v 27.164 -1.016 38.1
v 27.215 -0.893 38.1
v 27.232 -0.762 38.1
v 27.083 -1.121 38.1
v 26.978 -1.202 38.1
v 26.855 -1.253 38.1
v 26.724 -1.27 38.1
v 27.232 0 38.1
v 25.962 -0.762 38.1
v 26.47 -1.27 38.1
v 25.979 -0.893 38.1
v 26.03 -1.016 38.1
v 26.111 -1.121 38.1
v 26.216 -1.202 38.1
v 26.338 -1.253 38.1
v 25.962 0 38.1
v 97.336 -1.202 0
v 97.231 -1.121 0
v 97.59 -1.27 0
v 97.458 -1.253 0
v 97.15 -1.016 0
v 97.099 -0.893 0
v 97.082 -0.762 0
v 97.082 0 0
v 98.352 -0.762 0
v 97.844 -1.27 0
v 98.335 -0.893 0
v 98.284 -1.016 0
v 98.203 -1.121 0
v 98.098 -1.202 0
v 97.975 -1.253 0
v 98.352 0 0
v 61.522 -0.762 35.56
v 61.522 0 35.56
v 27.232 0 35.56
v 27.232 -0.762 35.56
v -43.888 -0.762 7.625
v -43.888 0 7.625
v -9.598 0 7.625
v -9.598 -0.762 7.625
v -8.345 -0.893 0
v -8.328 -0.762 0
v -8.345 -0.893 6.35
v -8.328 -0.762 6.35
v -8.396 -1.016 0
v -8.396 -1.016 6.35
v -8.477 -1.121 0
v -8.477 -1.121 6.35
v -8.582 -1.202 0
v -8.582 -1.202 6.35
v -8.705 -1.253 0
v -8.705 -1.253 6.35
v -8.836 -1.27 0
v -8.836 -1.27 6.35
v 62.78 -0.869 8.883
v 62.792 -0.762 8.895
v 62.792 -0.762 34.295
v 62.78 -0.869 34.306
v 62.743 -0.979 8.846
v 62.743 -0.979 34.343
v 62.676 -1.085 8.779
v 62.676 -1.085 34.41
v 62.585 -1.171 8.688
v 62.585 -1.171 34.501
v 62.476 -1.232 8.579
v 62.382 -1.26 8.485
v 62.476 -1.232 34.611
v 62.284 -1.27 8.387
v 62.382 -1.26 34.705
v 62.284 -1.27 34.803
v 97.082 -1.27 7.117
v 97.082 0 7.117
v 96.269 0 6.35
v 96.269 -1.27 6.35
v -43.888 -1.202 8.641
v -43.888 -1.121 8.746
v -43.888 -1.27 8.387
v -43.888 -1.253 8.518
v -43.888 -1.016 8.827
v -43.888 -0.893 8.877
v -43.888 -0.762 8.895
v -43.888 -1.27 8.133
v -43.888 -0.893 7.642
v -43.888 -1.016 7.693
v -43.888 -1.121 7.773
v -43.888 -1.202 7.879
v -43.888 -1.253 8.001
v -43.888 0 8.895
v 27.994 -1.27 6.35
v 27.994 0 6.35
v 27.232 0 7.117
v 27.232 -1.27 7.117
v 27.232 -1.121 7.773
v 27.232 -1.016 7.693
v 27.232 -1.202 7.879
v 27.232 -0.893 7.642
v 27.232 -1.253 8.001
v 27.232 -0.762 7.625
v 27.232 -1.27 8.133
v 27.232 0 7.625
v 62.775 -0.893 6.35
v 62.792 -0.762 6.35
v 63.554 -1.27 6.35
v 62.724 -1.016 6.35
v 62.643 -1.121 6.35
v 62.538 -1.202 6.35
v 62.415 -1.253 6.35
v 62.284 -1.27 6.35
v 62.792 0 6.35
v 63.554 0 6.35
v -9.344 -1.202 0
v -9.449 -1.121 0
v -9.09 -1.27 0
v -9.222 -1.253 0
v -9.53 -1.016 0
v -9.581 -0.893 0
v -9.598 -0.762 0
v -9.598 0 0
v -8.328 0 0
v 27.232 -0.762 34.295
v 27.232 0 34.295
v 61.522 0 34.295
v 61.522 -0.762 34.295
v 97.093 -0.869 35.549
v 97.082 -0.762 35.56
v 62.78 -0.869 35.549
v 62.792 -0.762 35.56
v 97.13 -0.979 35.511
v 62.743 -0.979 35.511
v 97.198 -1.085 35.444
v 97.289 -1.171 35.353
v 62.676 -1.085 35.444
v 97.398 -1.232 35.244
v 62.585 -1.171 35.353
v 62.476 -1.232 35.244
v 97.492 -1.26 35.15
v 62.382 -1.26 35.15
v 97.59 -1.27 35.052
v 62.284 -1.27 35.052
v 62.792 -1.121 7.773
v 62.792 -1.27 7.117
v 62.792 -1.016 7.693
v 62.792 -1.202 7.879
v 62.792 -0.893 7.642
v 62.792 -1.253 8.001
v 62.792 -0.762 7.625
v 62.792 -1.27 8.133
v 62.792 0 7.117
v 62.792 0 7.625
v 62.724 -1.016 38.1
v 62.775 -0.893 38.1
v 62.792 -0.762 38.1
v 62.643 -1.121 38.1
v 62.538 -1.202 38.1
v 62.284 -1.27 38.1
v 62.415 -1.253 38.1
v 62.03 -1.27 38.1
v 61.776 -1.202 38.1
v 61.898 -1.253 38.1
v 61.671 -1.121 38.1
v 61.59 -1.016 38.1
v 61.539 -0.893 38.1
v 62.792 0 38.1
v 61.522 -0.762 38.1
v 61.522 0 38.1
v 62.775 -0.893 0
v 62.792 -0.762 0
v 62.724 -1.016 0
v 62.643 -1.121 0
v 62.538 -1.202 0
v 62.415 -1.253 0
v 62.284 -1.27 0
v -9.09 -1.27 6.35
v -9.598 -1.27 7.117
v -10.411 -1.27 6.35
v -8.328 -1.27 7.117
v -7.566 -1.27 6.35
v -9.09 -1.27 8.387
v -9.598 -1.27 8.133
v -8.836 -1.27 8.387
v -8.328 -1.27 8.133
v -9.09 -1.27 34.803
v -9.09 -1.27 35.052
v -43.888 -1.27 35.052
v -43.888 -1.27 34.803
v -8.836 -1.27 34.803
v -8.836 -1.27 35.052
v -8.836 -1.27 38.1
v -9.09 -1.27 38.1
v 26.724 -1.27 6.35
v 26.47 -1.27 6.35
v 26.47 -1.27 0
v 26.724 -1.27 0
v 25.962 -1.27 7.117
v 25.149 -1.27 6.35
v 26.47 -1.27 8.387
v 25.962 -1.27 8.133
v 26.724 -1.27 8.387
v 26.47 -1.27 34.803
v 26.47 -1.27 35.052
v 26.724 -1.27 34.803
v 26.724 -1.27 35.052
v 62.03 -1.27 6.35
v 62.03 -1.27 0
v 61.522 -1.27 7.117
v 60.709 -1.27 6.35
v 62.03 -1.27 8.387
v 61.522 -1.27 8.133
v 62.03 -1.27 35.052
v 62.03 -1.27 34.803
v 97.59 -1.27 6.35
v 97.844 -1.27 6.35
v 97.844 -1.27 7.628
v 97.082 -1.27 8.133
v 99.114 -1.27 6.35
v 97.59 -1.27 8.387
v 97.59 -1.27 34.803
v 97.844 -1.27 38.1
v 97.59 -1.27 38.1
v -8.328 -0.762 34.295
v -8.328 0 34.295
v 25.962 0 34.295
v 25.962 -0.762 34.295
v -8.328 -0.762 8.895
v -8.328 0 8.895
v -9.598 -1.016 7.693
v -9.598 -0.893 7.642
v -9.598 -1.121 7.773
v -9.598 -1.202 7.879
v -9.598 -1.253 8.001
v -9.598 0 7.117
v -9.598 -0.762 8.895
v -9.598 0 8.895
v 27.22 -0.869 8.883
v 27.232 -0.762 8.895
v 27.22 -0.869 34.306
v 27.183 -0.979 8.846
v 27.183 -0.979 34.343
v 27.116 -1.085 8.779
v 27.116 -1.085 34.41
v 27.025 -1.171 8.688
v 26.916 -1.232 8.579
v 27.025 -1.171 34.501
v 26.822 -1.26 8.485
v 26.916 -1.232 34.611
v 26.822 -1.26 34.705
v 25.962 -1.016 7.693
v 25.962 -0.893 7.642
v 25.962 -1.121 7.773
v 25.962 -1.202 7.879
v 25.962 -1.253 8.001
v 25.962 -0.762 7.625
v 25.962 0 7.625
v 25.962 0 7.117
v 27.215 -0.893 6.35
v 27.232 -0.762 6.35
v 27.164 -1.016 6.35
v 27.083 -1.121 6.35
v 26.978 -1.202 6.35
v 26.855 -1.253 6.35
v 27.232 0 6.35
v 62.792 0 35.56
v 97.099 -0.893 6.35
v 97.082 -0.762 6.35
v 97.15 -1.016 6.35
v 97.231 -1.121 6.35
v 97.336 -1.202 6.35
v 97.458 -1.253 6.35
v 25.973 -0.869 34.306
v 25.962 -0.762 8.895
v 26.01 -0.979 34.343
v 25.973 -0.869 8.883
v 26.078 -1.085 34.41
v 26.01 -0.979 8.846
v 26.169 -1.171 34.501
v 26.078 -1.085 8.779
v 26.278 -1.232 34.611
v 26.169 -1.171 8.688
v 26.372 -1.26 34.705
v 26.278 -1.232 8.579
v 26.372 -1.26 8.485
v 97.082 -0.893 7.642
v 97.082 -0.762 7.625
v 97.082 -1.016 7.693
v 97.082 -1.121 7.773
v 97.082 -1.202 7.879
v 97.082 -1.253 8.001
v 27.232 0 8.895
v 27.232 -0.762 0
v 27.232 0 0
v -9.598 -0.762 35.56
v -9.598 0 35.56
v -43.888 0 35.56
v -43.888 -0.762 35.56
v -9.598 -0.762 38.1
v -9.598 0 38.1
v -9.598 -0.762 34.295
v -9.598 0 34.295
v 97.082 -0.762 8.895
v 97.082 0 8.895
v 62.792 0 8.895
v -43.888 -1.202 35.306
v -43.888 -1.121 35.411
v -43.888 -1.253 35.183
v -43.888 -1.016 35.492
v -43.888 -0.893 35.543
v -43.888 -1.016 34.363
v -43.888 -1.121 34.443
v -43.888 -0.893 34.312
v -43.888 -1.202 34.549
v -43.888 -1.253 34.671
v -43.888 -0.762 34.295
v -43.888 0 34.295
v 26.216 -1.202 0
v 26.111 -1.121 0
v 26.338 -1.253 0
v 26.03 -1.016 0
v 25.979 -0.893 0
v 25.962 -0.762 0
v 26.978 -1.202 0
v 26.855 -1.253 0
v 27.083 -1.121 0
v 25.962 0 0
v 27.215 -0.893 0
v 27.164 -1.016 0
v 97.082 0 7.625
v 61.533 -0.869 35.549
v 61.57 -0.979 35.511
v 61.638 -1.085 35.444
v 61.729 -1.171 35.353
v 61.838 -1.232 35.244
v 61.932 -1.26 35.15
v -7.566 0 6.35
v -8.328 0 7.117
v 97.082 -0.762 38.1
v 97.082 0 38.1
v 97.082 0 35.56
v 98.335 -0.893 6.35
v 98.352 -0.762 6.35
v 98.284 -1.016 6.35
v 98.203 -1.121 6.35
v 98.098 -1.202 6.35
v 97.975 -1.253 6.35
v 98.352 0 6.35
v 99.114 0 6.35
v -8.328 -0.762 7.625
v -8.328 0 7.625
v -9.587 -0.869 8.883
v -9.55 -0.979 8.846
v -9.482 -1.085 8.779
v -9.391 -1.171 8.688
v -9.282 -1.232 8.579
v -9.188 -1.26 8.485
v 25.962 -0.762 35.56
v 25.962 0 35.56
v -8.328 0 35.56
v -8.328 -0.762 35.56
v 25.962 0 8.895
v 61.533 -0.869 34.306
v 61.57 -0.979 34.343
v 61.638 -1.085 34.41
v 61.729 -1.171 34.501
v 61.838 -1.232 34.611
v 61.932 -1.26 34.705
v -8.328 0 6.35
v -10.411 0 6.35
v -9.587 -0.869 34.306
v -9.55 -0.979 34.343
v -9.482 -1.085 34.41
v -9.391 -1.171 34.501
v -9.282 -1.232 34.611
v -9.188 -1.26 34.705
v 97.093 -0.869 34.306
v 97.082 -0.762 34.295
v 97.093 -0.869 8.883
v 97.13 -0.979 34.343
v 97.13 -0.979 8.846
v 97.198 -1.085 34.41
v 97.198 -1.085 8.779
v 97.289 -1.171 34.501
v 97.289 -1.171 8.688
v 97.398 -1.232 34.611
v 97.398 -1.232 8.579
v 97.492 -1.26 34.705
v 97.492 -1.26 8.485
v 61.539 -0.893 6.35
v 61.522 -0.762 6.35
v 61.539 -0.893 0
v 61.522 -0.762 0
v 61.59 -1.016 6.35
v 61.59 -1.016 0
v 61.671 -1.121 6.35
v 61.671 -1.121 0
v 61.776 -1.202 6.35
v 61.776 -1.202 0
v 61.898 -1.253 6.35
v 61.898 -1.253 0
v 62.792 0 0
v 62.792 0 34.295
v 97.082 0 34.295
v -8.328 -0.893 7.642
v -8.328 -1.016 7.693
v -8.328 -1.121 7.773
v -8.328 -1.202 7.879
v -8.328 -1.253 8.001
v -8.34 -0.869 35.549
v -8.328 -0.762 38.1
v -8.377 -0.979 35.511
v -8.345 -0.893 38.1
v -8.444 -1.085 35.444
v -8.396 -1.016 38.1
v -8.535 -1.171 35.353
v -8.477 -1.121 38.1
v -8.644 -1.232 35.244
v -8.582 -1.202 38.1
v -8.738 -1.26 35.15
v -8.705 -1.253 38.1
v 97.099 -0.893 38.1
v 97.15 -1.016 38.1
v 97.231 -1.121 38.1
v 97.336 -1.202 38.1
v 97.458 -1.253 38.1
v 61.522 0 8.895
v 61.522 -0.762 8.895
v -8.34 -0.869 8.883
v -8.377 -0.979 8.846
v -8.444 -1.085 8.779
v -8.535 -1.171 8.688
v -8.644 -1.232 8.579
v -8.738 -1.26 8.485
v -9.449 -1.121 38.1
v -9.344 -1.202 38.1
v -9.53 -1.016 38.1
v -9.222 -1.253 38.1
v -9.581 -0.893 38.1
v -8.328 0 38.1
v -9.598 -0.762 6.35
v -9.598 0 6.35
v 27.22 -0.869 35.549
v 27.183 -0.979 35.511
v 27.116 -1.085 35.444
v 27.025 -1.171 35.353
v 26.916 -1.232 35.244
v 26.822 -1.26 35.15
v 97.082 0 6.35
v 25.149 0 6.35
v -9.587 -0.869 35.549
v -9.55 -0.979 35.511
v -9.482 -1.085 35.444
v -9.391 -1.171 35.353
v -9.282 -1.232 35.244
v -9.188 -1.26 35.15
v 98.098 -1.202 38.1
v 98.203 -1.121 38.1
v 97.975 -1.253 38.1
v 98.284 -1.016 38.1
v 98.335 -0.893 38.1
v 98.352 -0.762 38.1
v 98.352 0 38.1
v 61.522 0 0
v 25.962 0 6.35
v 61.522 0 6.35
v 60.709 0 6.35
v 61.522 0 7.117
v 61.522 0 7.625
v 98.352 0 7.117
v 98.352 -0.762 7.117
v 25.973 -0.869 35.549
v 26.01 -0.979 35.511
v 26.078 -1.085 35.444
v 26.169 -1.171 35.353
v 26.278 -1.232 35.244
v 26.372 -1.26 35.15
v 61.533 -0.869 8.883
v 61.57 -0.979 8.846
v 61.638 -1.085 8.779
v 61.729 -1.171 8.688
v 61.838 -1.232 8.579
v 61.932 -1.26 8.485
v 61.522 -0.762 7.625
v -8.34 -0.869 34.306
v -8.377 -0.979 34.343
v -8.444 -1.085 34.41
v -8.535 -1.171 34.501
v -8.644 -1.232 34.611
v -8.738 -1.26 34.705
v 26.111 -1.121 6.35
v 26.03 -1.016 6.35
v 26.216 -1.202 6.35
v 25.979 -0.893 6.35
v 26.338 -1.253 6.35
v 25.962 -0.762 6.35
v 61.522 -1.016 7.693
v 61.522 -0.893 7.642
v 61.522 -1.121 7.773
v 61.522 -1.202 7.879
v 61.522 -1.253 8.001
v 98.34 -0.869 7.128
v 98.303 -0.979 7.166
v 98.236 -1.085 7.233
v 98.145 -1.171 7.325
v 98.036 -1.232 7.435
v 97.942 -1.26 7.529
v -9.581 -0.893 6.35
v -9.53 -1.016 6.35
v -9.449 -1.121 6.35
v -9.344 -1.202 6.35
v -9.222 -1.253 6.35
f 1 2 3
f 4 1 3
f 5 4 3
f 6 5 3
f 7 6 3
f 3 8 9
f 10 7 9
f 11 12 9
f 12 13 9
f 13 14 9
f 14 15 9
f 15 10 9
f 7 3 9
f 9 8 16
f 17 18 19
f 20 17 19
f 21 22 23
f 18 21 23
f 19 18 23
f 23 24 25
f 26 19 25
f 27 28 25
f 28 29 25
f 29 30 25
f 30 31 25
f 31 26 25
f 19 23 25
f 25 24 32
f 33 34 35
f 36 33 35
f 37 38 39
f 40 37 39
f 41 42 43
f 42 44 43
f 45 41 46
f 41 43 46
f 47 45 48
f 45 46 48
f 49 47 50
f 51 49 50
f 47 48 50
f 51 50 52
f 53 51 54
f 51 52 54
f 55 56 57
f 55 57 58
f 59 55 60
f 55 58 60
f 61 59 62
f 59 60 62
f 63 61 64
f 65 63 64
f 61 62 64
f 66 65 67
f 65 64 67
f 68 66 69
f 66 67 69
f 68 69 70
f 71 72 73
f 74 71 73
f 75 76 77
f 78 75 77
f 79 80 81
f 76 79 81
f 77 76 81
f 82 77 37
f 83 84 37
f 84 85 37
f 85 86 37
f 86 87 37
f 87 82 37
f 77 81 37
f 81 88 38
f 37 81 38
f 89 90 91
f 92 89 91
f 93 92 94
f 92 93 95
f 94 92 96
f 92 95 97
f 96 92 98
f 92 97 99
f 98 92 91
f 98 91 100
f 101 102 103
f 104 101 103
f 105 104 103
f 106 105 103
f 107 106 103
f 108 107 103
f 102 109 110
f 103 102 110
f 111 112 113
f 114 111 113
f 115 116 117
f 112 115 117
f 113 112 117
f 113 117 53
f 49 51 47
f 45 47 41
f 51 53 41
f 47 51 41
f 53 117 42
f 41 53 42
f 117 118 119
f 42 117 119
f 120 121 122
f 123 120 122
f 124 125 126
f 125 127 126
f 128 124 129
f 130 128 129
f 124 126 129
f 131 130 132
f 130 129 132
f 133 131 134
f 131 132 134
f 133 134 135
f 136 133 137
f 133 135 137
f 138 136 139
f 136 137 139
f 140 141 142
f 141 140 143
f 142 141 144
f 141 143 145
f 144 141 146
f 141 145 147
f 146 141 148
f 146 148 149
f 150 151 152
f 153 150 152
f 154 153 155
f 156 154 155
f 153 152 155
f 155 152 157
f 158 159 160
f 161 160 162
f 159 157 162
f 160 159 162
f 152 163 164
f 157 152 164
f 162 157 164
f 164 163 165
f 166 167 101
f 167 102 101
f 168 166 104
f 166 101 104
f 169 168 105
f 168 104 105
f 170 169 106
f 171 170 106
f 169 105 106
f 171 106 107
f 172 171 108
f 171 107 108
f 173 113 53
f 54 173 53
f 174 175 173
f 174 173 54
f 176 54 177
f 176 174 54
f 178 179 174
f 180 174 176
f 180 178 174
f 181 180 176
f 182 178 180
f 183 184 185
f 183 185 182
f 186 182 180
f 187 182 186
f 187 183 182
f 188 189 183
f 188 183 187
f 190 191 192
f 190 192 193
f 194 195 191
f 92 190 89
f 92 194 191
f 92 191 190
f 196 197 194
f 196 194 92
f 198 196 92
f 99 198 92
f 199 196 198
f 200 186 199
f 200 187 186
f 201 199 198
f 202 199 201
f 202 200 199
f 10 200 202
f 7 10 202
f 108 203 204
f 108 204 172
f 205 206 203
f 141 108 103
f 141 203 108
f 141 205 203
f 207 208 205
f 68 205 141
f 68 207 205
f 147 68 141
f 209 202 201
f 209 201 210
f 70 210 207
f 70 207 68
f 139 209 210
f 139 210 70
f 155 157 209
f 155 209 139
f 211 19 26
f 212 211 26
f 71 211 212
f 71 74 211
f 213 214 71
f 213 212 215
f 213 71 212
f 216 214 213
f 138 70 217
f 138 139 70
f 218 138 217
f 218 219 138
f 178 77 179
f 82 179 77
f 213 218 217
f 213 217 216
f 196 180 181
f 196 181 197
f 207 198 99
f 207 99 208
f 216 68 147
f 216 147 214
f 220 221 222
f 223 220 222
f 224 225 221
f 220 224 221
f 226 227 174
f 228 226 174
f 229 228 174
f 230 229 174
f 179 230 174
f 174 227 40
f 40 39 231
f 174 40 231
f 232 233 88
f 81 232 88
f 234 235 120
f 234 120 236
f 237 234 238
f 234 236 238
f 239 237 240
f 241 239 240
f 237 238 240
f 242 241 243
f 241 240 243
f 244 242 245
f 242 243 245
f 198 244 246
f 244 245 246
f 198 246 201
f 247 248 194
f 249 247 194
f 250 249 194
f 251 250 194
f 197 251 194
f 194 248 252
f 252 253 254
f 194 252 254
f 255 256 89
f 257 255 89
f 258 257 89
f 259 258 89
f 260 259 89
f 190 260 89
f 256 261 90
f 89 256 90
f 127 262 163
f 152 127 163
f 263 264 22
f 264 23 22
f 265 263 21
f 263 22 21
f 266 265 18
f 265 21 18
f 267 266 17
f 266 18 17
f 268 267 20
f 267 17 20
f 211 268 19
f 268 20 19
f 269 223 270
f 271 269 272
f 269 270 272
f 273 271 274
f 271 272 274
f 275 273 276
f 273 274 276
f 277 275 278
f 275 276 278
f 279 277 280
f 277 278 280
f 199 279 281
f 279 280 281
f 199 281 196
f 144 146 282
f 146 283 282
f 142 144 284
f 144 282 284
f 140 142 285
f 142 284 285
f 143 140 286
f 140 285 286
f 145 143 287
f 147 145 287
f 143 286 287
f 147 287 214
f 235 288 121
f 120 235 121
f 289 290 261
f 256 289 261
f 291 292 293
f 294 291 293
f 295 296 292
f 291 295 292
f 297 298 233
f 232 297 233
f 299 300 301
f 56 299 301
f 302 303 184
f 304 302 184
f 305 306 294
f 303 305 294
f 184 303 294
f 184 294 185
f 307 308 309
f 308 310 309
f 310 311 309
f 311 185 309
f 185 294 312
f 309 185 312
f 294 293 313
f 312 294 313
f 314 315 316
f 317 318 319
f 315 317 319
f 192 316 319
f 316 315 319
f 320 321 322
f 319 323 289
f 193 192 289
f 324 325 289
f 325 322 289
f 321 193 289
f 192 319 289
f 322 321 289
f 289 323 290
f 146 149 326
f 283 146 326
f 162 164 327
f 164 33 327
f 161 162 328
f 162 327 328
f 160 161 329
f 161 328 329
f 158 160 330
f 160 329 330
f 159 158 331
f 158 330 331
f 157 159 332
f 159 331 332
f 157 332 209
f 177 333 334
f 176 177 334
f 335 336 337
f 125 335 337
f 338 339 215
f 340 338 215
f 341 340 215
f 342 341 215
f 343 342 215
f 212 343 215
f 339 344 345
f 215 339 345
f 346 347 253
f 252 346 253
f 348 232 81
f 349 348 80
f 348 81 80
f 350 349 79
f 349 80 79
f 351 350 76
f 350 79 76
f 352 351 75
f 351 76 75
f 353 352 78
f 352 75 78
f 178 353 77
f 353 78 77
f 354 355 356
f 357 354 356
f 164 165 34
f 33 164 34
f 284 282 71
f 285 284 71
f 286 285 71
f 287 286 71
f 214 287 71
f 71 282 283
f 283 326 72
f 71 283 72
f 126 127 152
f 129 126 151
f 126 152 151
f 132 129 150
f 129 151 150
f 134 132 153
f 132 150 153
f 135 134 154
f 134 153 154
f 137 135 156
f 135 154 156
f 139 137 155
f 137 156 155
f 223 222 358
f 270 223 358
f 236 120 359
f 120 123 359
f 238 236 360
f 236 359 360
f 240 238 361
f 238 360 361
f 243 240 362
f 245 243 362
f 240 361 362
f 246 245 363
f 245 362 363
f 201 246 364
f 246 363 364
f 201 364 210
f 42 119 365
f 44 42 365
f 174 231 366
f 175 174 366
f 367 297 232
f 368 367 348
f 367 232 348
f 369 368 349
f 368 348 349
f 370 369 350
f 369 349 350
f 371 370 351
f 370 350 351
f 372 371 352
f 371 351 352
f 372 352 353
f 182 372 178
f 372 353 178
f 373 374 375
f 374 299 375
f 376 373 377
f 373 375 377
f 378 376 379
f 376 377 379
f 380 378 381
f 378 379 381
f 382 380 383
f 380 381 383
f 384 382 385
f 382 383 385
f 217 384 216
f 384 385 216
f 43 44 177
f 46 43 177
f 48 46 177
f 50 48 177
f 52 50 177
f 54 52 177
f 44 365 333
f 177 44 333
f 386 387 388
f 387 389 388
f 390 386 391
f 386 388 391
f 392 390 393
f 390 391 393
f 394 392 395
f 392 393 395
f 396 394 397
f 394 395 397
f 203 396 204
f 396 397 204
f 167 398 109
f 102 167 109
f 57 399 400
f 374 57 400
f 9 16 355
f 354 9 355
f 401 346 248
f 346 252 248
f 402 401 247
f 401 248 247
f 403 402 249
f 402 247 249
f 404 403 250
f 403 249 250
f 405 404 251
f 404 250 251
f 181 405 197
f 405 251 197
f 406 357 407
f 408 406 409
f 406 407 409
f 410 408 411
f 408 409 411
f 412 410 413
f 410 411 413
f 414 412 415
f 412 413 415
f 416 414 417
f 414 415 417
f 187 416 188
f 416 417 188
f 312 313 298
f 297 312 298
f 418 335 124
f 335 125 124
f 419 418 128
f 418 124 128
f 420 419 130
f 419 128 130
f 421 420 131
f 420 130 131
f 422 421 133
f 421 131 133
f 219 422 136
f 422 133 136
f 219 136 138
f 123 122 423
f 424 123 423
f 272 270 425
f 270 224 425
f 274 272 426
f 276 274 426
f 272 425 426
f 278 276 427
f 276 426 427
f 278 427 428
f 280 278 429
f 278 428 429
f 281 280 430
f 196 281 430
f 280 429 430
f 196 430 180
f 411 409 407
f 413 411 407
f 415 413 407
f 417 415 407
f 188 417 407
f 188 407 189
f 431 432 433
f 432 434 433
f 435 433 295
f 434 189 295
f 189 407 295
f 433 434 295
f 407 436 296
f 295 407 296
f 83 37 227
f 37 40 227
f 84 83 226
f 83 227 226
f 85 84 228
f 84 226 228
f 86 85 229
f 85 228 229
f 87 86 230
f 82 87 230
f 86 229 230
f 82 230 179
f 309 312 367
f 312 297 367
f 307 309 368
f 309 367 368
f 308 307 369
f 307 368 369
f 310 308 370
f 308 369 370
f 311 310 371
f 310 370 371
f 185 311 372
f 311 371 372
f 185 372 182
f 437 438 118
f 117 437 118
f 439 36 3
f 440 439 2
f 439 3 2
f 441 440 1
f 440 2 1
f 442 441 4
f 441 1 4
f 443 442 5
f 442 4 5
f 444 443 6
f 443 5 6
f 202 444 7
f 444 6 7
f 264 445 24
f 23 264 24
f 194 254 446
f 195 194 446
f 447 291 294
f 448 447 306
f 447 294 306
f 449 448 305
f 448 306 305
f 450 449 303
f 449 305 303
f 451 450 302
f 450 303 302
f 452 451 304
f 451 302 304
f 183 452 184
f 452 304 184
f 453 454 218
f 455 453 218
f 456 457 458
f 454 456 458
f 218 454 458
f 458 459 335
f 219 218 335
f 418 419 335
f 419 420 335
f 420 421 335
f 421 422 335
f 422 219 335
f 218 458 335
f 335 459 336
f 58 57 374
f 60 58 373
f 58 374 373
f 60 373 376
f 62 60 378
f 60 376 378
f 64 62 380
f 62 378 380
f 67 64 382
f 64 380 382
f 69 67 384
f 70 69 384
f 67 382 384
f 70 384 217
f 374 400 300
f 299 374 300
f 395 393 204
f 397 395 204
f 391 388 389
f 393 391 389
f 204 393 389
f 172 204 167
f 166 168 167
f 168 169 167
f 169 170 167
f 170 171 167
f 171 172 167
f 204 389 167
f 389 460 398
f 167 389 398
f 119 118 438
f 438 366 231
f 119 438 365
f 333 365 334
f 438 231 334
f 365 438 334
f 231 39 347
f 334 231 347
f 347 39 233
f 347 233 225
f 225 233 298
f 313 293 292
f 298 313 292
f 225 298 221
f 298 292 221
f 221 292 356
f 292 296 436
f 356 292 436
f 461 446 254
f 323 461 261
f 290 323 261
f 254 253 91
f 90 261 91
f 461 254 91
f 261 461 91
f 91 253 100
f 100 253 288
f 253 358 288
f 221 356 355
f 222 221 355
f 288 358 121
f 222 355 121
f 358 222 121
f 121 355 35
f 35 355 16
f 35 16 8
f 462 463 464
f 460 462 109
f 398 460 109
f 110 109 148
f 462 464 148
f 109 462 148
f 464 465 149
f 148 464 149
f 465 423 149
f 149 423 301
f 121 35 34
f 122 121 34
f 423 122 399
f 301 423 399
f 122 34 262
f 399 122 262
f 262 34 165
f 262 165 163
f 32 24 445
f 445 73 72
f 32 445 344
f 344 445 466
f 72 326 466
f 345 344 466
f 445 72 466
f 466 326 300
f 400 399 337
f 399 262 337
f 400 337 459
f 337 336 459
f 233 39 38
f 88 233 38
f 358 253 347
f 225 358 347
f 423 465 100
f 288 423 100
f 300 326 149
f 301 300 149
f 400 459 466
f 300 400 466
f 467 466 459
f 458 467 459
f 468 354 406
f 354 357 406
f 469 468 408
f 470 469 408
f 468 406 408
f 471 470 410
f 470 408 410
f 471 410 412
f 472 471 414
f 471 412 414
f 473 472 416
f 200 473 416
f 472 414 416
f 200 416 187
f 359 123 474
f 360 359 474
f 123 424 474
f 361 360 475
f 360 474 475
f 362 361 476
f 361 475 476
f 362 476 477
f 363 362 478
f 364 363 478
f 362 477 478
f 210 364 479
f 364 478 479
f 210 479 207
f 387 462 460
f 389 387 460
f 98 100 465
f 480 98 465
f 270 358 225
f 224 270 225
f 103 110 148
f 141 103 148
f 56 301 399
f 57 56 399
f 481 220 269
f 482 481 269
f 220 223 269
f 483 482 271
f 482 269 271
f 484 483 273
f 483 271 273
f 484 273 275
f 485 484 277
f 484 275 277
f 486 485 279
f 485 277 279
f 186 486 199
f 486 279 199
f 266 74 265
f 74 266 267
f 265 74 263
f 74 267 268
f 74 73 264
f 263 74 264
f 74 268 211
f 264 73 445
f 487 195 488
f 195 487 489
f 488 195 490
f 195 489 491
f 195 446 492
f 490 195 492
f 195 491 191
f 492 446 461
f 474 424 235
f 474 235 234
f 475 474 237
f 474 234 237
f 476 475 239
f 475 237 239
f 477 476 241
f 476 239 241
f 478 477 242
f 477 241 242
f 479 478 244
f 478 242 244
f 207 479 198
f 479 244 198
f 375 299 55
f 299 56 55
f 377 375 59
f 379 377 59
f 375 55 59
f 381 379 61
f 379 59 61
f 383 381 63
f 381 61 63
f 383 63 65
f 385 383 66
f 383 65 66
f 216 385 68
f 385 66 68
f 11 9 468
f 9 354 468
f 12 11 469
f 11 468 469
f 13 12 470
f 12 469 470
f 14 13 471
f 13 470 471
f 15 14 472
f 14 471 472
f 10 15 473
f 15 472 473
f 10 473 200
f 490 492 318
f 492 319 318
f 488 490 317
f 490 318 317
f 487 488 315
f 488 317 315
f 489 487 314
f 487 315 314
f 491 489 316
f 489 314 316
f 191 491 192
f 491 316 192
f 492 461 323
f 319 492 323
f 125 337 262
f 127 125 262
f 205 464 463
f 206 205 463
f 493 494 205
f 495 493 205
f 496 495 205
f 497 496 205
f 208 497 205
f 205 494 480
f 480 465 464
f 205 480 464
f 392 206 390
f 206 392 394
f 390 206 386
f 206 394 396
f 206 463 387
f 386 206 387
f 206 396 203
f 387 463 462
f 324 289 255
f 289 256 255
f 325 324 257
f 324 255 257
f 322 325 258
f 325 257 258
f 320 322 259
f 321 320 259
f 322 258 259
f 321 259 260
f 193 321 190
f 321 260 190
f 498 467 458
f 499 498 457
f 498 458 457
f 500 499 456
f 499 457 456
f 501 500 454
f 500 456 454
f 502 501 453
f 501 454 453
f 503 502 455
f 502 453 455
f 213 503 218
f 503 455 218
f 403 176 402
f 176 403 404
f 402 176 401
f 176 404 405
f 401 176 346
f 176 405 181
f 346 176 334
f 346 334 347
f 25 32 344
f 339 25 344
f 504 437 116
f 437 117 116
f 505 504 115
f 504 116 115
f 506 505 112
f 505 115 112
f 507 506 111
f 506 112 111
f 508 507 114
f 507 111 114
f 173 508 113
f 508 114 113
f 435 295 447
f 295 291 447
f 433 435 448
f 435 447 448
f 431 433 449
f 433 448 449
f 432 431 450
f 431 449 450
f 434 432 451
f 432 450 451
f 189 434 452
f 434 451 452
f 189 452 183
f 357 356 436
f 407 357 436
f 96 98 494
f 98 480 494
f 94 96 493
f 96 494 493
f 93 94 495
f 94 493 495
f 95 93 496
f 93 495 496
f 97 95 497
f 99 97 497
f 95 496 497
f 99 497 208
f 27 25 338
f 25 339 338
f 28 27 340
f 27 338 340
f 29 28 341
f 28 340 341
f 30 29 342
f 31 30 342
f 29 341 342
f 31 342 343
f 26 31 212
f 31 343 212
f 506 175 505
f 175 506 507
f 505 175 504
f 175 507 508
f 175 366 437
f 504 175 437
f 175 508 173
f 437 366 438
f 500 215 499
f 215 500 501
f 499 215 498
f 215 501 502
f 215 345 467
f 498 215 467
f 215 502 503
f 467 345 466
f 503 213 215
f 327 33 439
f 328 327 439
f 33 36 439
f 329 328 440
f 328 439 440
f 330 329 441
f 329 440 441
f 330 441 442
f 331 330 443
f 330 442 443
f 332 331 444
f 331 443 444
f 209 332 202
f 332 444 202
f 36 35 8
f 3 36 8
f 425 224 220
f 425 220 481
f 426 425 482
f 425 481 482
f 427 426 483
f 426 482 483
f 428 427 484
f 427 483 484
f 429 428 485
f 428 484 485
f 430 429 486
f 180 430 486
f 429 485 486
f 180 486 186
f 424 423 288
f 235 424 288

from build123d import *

# Parameters (mm, degrees)
F1_DEPTH = 1.27
F2_R     = 0.508


with BuildPart() as f1:
    # F0 (on Front) → F1 (new body)
    with BuildSketch(Plane.XZ):
        Polygon((-8.3281235051, 34.2946868681), (-8.3281235051, 35.56), (-8.3281235051, 38.1), (-9.5981235051, 38.1), (-9.5981235051, 35.56), (-43.8881235051, 35.56), (-43.8881235051, 34.2946868681), (-9.5981235051, 34.2946868681), (-9.5981235051, 8.8946868681), (-43.8881235051, 8.8946868681), (-43.8881235051, 7.6246868681), (-9.5981235051, 7.6246868681), (-9.5981235051, 7.1166868681), (-10.4112418222, 6.35), (-9.5981235051, 6.35), (-9.5981235051, 0), (-8.3281235051, 0), (-8.3281235051, 6.35), (-7.5661235051, 6.35), (-8.3281235051, 7.1166868681), (-8.3281235051, 7.6246868681), (-8.3281235051, 8.8946868681), align=None)
        Polygon((27.2318764949, 34.2946868681), (27.2318764949, 35.56), (27.2318764949, 38.1), (25.9618764949, 38.1), (25.9618764949, 35.56), (-8.3281235051, 35.56), (-8.3281235051, 34.2946868681), (25.9618764949, 34.2946868681), (25.9618764949, 8.8946868681), (-8.3281235051, 8.8946868681), (-8.3281235051, 7.6246868681), (25.9618764949, 7.6246868681), (25.9618764949, 7.1166868681), (25.1487581778, 6.35), (25.9618764949, 6.35), (25.9618764949, 0), (27.2318764949, 0), (27.2318764949, 6.35), (27.9938764949, 6.35), (27.2318764949, 7.1166868681), (27.2318764949, 7.6246868681), (27.2318764949, 8.8946868681), align=None)
        Polygon((62.7918764949, 34.2946868681), (62.7918764949, 35.56), (62.7918764949, 38.1), (61.5218764949, 38.1), (61.5218764949, 35.56), (27.2318764949, 35.56), (27.2318764949, 34.2946868681), (61.5218764949, 34.2946868681), (61.5218764949, 8.8946868681), (27.2318764949, 8.8946868681), (27.2318764949, 7.6246868681), (61.5218764949, 7.6246868681), (61.5218764949, 7.1166868681), (60.7087581778, 6.35), (61.5218764949, 6.35), (61.5218764949, 0), (62.7918764949, 0), (62.7918764949, 6.35), (63.5538764949, 6.35), (62.7918764949, 7.1166868681), (62.7918764949, 7.6246868681), (62.7918764949, 8.8946868681), align=None)
        Polygon((98.3518764949, 7.1166868681), (98.3518764949, 38.1), (97.0818764949, 38.1), (97.0818764949, 35.56), (62.7918764949, 35.56), (62.7918764949, 34.2946868681), (97.0818764949, 34.2946868681), (97.0818764949, 8.8946868681), (62.7918764949, 8.8946868681), (62.7918764949, 7.6246868681), (97.0818764949, 7.6246868681), (97.0818764949, 7.1166868681), (96.2687581778, 6.35), (97.0818764949, 6.35), (97.0818764949, 0), (98.3518764949, 0), (98.3518764949, 6.35), (99.1138764949, 6.35), align=None)
    extrude(amount=F1_DEPTH)

    # F2
    f2_edges = [f1.edges().sort_by_distance(p)[0] for p in [
        (-26.743124, -1.27, 34.294687),
        (-26.743124, -1.27, 35.56),
        (-9.598124, -1.27, 21.594687),
        (-8.328124, -1.27, 21.594687),
        (-26.743124, -1.27, 8.894687),
        (-26.743124, -1.27, 7.624687),
        (-9.598124, -1.27, 36.83),
        (25.961876, -1.27, 36.83),
        (61.521876, -1.27, 36.83),
        (27.231876, -1.27, 36.83),
        (-8.328124, -1.27, 36.83),
        (8.816876, -1.27, 35.56),
        (8.816876, -1.27, 34.294687),
        (8.816876, -1.27, 8.894687),
        (8.816876, -1.27, 7.624687),
        (-8.328124, -1.27, 3.175),
        (27.231876, -1.27, 3.175),
        (62.791876, -1.27, 3.175),
        (44.376876, -1.27, 7.624687),
        (44.376876, -1.27, 8.894687),
        (44.376876, -1.27, 34.294687),
        (44.376876, -1.27, 35.56),
        (62.791876, -1.27, 36.83),
        (79.936876, -1.27, 35.56),
        (79.936876, -1.27, 34.294687),
        (62.791876, -1.27, 21.594687),
        (61.521876, -1.27, 21.594687),
        (79.936876, -1.27, 8.894687),
        (79.936876, -1.27, 7.624687),
        (61.521876, -1.27, 3.175),
        (25.961876, -1.27, 3.175),
        (27.231876, -1.27, 21.594687),
        (25.961876, -1.27, 21.594687),
        (-9.598124, -1.27, 3.175),
        (97.081876, -1.27, 36.83),
        (97.081876, -1.27, 21.594687),
        (98.351876, -1.27, 3.175),
        (98.351876, -1.27, 22.608343),
        (97.081876, -1.27, 3.175),
    ]]
    fillet(f2_edges, radius=F2_R)


solid = f1.part
